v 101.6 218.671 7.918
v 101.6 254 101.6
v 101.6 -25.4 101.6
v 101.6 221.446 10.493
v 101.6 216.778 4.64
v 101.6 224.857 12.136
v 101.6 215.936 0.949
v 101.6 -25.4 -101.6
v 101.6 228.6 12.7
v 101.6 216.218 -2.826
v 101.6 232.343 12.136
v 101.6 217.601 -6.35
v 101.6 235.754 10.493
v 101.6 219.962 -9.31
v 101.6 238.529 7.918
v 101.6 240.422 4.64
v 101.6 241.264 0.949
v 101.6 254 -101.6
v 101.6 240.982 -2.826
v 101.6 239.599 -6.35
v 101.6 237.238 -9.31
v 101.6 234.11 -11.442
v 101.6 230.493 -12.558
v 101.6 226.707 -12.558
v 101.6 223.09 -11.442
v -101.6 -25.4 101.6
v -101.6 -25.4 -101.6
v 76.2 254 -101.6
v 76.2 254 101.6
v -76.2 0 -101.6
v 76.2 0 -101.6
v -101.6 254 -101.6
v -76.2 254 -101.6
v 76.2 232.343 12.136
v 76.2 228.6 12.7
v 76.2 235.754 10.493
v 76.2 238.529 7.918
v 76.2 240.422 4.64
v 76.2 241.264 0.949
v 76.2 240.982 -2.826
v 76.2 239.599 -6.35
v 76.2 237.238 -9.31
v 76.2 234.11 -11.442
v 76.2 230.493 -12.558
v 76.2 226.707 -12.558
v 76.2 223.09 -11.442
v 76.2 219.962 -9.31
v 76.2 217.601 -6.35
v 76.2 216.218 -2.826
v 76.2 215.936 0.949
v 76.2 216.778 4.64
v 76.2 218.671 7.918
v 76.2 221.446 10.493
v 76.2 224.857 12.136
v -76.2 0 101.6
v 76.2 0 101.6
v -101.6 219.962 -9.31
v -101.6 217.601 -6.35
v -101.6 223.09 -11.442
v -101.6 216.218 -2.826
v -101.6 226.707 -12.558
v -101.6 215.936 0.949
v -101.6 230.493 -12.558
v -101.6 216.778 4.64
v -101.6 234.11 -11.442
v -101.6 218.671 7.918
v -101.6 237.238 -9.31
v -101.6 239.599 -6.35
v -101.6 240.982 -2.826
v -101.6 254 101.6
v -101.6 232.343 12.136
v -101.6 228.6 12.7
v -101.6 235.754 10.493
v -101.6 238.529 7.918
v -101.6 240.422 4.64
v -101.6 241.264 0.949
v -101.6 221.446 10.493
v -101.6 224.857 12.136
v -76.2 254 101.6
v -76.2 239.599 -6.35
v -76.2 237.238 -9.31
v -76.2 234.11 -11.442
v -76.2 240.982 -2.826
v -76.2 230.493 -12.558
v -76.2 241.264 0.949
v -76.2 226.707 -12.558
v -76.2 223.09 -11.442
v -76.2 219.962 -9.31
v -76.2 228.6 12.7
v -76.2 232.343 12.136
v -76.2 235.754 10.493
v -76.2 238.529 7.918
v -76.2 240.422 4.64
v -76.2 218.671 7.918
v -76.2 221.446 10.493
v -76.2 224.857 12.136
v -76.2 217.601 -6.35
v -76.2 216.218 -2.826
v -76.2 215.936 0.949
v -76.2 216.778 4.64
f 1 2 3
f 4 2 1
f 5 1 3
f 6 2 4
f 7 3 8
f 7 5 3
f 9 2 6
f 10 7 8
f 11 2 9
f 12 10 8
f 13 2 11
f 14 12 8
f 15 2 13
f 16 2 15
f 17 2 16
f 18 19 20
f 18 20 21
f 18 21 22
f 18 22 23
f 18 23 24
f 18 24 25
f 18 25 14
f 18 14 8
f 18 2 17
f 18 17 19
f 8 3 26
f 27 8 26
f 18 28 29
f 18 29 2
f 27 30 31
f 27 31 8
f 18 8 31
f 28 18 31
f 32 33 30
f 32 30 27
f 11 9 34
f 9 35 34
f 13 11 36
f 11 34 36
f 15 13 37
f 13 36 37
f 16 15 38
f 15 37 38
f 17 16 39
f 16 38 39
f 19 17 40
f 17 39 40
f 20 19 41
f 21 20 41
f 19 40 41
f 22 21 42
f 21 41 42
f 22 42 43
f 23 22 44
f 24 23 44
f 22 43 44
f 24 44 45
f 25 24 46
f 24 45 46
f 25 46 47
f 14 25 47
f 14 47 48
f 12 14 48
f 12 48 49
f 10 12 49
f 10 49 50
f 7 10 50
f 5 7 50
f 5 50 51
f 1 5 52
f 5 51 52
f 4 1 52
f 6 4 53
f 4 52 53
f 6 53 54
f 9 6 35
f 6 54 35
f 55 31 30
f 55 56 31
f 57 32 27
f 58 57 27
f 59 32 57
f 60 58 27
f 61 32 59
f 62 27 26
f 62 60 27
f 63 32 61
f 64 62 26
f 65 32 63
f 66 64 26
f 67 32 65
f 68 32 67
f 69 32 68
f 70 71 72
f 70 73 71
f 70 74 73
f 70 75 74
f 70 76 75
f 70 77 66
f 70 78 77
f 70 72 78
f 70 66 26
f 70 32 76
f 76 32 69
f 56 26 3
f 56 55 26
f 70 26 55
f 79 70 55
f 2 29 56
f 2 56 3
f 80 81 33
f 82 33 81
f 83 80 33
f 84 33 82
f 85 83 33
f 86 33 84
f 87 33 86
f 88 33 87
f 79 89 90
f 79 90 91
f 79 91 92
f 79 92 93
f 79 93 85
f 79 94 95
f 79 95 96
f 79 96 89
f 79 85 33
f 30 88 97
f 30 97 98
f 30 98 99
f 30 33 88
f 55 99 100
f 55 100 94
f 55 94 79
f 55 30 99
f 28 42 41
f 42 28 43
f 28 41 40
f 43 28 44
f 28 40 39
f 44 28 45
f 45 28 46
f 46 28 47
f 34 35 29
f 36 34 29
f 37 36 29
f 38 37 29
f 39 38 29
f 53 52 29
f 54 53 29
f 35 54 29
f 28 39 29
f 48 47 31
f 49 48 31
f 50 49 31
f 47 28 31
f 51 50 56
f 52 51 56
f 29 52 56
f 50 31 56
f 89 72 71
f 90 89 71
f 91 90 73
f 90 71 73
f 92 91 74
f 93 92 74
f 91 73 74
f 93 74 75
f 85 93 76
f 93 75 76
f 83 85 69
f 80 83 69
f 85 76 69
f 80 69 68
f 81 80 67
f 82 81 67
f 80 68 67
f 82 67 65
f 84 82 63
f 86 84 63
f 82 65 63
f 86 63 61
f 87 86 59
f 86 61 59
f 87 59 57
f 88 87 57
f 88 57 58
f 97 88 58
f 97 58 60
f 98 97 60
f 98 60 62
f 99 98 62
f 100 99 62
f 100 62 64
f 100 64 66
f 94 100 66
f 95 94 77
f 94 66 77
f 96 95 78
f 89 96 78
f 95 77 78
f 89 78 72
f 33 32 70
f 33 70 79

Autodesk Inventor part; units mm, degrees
ref_plane "YZ Plane" through (0, 0, 0) normal (1, 0, 0) x (0, 1, 0)
ref_plane "XZ Plane" through (0, 0, 0) normal (0, 1, 0) x (-1, 0, 0)
ref_plane "XY Plane" through (0, 0, 0) normal (0, 0, 1) x (1, 0, 0)
sketch "Sketch1" plane through (0, 0, 0) normal (0, 1, 0) x (-1, 0, 0)
  line L0 (101.6, 101.6) -> (-101.6, 101.6)
  line L1 (-101.6, 101.6) -> (-101.6, -101.6)
  line L2 (-101.6, -101.6) -> (101.6, -101.6)
  line L3 (101.6, -101.6) -> (101.6, 101.6)
  line L4 (101.6, 101.6) -> (-101.6, -101.6) construction
  line L5 (-101.6, 101.6) -> (101.6, -101.6) construction
  point P0 (0, 0)
  dimension "d0" = 203.2
  dimension "d1" = 203.2
extrude "Extrusion1" add sketch "Sketch1" against normal blind 25.4
sketch "Sketch2" plane through (0, 0, 0) normal (0, 1, 0) x (1, 0, 0)
  line L0 (-101.6, -101.6) -> (-101.6, 101.6) projected
  line L1 (101.6, -101.6) -> (-101.6, -101.6) projected
  line L2 (-101.6, 101.6) -> (-76.2, 101.6)
  line L3 (-76.2, 101.6) -> (-76.2, -101.6)
  line L4 (-76.2, -101.6) -> (-101.6, -101.6)
  line L5 (-101.6, -101.6) -> (-101.6, 101.6)
  line L6 (101.6, 101.6) -> (101.6, -101.6) projected
  line L7 (101.6, 101.6) -> (76.2, 101.6)
  line L8 (76.2, 101.6) -> (76.2, -101.6)
  line L9 (76.2, -101.6) -> (101.6, -101.6)
  line L10 (101.6, -101.6) -> (101.6, 101.6)
  point P0 (0, 0)
  dimension "d4" = 25.4
  dimension "d5" = 25.4
extrude "Extrusion2" add sketch "Sketch2" along normal blind 254
sketch "Sketch3" plane through (-101.6, -25.4, -101.6) normal (-1, 0, 0) x (0, 0, 1)
  circle A0 centre (101.6, 254) radius 12.7
  line L0 (0, 279.4) -> (203.2, 279.4) projected
  point P0 (101.6, 25.4)
  dimension "d8" = 25.4
  dimension "d9" = 25.4
extrude "Extrusion4" cut sketch "Sketch3" against normal through all
properties part number "clutch02-forkBase" material "Wood (Birch)"
